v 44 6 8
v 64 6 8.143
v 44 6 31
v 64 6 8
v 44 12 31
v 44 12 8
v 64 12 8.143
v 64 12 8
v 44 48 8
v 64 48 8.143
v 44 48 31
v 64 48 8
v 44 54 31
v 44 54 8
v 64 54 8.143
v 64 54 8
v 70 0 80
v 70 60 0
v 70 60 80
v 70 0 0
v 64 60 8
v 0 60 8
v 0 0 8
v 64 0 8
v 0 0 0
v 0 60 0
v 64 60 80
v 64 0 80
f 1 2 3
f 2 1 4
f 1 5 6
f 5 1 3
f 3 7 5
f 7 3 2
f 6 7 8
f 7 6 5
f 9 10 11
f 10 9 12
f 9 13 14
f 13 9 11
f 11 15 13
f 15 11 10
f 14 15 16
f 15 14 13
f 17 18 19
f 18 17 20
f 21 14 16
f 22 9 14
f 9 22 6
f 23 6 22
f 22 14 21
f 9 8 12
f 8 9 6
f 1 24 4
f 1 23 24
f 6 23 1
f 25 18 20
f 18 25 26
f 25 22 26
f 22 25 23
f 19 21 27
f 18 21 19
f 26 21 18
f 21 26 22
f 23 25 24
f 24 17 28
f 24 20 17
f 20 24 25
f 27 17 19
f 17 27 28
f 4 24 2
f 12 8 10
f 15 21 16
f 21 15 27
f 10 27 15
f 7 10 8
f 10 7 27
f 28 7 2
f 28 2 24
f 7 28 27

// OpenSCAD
$fn = 32;

// ----------------------------------------------------------------------
// Rib bracket: 2-gusset L bracket
// ----------------------------------------------------------------------

// --- parameters (mm) ---
base_l = 70;              // foot length, X
base_w = 60;              // foot width, Y
base_t = 8;               // foot thickness
plate_t = 6;              // upright plate thickness
plate_h = 80;             // overall height
gus_l = 20;               // gusset leg along the foot
gus_h = 24;               // gusset height
gus_t = 6;                // gusset thickness
gus_edge = 6;             // gusset margin from the foot edge
n_gus = 2;                // gusset count

gus_pitch = (base_w - 2 * gus_edge - gus_t) / (n_gus - 1);  // gusset pitch

union() {
  cube([base_l, base_w, base_t]);
  translate([base_l - plate_t, 0, base_t - 1])
    cube([plate_t, base_w, plate_h - base_t + 1]);
  for (i = [0 : n_gus - 1])
    translate([base_l - plate_t - gus_l, gus_edge + i * gus_pitch, base_t - 1])
      rotate([-90, 0, 0])
        linear_extrude(height = gus_t)
          polygon(points = [[0, 0], [gus_l + 1, 0], [0, -gus_h]]);
}
